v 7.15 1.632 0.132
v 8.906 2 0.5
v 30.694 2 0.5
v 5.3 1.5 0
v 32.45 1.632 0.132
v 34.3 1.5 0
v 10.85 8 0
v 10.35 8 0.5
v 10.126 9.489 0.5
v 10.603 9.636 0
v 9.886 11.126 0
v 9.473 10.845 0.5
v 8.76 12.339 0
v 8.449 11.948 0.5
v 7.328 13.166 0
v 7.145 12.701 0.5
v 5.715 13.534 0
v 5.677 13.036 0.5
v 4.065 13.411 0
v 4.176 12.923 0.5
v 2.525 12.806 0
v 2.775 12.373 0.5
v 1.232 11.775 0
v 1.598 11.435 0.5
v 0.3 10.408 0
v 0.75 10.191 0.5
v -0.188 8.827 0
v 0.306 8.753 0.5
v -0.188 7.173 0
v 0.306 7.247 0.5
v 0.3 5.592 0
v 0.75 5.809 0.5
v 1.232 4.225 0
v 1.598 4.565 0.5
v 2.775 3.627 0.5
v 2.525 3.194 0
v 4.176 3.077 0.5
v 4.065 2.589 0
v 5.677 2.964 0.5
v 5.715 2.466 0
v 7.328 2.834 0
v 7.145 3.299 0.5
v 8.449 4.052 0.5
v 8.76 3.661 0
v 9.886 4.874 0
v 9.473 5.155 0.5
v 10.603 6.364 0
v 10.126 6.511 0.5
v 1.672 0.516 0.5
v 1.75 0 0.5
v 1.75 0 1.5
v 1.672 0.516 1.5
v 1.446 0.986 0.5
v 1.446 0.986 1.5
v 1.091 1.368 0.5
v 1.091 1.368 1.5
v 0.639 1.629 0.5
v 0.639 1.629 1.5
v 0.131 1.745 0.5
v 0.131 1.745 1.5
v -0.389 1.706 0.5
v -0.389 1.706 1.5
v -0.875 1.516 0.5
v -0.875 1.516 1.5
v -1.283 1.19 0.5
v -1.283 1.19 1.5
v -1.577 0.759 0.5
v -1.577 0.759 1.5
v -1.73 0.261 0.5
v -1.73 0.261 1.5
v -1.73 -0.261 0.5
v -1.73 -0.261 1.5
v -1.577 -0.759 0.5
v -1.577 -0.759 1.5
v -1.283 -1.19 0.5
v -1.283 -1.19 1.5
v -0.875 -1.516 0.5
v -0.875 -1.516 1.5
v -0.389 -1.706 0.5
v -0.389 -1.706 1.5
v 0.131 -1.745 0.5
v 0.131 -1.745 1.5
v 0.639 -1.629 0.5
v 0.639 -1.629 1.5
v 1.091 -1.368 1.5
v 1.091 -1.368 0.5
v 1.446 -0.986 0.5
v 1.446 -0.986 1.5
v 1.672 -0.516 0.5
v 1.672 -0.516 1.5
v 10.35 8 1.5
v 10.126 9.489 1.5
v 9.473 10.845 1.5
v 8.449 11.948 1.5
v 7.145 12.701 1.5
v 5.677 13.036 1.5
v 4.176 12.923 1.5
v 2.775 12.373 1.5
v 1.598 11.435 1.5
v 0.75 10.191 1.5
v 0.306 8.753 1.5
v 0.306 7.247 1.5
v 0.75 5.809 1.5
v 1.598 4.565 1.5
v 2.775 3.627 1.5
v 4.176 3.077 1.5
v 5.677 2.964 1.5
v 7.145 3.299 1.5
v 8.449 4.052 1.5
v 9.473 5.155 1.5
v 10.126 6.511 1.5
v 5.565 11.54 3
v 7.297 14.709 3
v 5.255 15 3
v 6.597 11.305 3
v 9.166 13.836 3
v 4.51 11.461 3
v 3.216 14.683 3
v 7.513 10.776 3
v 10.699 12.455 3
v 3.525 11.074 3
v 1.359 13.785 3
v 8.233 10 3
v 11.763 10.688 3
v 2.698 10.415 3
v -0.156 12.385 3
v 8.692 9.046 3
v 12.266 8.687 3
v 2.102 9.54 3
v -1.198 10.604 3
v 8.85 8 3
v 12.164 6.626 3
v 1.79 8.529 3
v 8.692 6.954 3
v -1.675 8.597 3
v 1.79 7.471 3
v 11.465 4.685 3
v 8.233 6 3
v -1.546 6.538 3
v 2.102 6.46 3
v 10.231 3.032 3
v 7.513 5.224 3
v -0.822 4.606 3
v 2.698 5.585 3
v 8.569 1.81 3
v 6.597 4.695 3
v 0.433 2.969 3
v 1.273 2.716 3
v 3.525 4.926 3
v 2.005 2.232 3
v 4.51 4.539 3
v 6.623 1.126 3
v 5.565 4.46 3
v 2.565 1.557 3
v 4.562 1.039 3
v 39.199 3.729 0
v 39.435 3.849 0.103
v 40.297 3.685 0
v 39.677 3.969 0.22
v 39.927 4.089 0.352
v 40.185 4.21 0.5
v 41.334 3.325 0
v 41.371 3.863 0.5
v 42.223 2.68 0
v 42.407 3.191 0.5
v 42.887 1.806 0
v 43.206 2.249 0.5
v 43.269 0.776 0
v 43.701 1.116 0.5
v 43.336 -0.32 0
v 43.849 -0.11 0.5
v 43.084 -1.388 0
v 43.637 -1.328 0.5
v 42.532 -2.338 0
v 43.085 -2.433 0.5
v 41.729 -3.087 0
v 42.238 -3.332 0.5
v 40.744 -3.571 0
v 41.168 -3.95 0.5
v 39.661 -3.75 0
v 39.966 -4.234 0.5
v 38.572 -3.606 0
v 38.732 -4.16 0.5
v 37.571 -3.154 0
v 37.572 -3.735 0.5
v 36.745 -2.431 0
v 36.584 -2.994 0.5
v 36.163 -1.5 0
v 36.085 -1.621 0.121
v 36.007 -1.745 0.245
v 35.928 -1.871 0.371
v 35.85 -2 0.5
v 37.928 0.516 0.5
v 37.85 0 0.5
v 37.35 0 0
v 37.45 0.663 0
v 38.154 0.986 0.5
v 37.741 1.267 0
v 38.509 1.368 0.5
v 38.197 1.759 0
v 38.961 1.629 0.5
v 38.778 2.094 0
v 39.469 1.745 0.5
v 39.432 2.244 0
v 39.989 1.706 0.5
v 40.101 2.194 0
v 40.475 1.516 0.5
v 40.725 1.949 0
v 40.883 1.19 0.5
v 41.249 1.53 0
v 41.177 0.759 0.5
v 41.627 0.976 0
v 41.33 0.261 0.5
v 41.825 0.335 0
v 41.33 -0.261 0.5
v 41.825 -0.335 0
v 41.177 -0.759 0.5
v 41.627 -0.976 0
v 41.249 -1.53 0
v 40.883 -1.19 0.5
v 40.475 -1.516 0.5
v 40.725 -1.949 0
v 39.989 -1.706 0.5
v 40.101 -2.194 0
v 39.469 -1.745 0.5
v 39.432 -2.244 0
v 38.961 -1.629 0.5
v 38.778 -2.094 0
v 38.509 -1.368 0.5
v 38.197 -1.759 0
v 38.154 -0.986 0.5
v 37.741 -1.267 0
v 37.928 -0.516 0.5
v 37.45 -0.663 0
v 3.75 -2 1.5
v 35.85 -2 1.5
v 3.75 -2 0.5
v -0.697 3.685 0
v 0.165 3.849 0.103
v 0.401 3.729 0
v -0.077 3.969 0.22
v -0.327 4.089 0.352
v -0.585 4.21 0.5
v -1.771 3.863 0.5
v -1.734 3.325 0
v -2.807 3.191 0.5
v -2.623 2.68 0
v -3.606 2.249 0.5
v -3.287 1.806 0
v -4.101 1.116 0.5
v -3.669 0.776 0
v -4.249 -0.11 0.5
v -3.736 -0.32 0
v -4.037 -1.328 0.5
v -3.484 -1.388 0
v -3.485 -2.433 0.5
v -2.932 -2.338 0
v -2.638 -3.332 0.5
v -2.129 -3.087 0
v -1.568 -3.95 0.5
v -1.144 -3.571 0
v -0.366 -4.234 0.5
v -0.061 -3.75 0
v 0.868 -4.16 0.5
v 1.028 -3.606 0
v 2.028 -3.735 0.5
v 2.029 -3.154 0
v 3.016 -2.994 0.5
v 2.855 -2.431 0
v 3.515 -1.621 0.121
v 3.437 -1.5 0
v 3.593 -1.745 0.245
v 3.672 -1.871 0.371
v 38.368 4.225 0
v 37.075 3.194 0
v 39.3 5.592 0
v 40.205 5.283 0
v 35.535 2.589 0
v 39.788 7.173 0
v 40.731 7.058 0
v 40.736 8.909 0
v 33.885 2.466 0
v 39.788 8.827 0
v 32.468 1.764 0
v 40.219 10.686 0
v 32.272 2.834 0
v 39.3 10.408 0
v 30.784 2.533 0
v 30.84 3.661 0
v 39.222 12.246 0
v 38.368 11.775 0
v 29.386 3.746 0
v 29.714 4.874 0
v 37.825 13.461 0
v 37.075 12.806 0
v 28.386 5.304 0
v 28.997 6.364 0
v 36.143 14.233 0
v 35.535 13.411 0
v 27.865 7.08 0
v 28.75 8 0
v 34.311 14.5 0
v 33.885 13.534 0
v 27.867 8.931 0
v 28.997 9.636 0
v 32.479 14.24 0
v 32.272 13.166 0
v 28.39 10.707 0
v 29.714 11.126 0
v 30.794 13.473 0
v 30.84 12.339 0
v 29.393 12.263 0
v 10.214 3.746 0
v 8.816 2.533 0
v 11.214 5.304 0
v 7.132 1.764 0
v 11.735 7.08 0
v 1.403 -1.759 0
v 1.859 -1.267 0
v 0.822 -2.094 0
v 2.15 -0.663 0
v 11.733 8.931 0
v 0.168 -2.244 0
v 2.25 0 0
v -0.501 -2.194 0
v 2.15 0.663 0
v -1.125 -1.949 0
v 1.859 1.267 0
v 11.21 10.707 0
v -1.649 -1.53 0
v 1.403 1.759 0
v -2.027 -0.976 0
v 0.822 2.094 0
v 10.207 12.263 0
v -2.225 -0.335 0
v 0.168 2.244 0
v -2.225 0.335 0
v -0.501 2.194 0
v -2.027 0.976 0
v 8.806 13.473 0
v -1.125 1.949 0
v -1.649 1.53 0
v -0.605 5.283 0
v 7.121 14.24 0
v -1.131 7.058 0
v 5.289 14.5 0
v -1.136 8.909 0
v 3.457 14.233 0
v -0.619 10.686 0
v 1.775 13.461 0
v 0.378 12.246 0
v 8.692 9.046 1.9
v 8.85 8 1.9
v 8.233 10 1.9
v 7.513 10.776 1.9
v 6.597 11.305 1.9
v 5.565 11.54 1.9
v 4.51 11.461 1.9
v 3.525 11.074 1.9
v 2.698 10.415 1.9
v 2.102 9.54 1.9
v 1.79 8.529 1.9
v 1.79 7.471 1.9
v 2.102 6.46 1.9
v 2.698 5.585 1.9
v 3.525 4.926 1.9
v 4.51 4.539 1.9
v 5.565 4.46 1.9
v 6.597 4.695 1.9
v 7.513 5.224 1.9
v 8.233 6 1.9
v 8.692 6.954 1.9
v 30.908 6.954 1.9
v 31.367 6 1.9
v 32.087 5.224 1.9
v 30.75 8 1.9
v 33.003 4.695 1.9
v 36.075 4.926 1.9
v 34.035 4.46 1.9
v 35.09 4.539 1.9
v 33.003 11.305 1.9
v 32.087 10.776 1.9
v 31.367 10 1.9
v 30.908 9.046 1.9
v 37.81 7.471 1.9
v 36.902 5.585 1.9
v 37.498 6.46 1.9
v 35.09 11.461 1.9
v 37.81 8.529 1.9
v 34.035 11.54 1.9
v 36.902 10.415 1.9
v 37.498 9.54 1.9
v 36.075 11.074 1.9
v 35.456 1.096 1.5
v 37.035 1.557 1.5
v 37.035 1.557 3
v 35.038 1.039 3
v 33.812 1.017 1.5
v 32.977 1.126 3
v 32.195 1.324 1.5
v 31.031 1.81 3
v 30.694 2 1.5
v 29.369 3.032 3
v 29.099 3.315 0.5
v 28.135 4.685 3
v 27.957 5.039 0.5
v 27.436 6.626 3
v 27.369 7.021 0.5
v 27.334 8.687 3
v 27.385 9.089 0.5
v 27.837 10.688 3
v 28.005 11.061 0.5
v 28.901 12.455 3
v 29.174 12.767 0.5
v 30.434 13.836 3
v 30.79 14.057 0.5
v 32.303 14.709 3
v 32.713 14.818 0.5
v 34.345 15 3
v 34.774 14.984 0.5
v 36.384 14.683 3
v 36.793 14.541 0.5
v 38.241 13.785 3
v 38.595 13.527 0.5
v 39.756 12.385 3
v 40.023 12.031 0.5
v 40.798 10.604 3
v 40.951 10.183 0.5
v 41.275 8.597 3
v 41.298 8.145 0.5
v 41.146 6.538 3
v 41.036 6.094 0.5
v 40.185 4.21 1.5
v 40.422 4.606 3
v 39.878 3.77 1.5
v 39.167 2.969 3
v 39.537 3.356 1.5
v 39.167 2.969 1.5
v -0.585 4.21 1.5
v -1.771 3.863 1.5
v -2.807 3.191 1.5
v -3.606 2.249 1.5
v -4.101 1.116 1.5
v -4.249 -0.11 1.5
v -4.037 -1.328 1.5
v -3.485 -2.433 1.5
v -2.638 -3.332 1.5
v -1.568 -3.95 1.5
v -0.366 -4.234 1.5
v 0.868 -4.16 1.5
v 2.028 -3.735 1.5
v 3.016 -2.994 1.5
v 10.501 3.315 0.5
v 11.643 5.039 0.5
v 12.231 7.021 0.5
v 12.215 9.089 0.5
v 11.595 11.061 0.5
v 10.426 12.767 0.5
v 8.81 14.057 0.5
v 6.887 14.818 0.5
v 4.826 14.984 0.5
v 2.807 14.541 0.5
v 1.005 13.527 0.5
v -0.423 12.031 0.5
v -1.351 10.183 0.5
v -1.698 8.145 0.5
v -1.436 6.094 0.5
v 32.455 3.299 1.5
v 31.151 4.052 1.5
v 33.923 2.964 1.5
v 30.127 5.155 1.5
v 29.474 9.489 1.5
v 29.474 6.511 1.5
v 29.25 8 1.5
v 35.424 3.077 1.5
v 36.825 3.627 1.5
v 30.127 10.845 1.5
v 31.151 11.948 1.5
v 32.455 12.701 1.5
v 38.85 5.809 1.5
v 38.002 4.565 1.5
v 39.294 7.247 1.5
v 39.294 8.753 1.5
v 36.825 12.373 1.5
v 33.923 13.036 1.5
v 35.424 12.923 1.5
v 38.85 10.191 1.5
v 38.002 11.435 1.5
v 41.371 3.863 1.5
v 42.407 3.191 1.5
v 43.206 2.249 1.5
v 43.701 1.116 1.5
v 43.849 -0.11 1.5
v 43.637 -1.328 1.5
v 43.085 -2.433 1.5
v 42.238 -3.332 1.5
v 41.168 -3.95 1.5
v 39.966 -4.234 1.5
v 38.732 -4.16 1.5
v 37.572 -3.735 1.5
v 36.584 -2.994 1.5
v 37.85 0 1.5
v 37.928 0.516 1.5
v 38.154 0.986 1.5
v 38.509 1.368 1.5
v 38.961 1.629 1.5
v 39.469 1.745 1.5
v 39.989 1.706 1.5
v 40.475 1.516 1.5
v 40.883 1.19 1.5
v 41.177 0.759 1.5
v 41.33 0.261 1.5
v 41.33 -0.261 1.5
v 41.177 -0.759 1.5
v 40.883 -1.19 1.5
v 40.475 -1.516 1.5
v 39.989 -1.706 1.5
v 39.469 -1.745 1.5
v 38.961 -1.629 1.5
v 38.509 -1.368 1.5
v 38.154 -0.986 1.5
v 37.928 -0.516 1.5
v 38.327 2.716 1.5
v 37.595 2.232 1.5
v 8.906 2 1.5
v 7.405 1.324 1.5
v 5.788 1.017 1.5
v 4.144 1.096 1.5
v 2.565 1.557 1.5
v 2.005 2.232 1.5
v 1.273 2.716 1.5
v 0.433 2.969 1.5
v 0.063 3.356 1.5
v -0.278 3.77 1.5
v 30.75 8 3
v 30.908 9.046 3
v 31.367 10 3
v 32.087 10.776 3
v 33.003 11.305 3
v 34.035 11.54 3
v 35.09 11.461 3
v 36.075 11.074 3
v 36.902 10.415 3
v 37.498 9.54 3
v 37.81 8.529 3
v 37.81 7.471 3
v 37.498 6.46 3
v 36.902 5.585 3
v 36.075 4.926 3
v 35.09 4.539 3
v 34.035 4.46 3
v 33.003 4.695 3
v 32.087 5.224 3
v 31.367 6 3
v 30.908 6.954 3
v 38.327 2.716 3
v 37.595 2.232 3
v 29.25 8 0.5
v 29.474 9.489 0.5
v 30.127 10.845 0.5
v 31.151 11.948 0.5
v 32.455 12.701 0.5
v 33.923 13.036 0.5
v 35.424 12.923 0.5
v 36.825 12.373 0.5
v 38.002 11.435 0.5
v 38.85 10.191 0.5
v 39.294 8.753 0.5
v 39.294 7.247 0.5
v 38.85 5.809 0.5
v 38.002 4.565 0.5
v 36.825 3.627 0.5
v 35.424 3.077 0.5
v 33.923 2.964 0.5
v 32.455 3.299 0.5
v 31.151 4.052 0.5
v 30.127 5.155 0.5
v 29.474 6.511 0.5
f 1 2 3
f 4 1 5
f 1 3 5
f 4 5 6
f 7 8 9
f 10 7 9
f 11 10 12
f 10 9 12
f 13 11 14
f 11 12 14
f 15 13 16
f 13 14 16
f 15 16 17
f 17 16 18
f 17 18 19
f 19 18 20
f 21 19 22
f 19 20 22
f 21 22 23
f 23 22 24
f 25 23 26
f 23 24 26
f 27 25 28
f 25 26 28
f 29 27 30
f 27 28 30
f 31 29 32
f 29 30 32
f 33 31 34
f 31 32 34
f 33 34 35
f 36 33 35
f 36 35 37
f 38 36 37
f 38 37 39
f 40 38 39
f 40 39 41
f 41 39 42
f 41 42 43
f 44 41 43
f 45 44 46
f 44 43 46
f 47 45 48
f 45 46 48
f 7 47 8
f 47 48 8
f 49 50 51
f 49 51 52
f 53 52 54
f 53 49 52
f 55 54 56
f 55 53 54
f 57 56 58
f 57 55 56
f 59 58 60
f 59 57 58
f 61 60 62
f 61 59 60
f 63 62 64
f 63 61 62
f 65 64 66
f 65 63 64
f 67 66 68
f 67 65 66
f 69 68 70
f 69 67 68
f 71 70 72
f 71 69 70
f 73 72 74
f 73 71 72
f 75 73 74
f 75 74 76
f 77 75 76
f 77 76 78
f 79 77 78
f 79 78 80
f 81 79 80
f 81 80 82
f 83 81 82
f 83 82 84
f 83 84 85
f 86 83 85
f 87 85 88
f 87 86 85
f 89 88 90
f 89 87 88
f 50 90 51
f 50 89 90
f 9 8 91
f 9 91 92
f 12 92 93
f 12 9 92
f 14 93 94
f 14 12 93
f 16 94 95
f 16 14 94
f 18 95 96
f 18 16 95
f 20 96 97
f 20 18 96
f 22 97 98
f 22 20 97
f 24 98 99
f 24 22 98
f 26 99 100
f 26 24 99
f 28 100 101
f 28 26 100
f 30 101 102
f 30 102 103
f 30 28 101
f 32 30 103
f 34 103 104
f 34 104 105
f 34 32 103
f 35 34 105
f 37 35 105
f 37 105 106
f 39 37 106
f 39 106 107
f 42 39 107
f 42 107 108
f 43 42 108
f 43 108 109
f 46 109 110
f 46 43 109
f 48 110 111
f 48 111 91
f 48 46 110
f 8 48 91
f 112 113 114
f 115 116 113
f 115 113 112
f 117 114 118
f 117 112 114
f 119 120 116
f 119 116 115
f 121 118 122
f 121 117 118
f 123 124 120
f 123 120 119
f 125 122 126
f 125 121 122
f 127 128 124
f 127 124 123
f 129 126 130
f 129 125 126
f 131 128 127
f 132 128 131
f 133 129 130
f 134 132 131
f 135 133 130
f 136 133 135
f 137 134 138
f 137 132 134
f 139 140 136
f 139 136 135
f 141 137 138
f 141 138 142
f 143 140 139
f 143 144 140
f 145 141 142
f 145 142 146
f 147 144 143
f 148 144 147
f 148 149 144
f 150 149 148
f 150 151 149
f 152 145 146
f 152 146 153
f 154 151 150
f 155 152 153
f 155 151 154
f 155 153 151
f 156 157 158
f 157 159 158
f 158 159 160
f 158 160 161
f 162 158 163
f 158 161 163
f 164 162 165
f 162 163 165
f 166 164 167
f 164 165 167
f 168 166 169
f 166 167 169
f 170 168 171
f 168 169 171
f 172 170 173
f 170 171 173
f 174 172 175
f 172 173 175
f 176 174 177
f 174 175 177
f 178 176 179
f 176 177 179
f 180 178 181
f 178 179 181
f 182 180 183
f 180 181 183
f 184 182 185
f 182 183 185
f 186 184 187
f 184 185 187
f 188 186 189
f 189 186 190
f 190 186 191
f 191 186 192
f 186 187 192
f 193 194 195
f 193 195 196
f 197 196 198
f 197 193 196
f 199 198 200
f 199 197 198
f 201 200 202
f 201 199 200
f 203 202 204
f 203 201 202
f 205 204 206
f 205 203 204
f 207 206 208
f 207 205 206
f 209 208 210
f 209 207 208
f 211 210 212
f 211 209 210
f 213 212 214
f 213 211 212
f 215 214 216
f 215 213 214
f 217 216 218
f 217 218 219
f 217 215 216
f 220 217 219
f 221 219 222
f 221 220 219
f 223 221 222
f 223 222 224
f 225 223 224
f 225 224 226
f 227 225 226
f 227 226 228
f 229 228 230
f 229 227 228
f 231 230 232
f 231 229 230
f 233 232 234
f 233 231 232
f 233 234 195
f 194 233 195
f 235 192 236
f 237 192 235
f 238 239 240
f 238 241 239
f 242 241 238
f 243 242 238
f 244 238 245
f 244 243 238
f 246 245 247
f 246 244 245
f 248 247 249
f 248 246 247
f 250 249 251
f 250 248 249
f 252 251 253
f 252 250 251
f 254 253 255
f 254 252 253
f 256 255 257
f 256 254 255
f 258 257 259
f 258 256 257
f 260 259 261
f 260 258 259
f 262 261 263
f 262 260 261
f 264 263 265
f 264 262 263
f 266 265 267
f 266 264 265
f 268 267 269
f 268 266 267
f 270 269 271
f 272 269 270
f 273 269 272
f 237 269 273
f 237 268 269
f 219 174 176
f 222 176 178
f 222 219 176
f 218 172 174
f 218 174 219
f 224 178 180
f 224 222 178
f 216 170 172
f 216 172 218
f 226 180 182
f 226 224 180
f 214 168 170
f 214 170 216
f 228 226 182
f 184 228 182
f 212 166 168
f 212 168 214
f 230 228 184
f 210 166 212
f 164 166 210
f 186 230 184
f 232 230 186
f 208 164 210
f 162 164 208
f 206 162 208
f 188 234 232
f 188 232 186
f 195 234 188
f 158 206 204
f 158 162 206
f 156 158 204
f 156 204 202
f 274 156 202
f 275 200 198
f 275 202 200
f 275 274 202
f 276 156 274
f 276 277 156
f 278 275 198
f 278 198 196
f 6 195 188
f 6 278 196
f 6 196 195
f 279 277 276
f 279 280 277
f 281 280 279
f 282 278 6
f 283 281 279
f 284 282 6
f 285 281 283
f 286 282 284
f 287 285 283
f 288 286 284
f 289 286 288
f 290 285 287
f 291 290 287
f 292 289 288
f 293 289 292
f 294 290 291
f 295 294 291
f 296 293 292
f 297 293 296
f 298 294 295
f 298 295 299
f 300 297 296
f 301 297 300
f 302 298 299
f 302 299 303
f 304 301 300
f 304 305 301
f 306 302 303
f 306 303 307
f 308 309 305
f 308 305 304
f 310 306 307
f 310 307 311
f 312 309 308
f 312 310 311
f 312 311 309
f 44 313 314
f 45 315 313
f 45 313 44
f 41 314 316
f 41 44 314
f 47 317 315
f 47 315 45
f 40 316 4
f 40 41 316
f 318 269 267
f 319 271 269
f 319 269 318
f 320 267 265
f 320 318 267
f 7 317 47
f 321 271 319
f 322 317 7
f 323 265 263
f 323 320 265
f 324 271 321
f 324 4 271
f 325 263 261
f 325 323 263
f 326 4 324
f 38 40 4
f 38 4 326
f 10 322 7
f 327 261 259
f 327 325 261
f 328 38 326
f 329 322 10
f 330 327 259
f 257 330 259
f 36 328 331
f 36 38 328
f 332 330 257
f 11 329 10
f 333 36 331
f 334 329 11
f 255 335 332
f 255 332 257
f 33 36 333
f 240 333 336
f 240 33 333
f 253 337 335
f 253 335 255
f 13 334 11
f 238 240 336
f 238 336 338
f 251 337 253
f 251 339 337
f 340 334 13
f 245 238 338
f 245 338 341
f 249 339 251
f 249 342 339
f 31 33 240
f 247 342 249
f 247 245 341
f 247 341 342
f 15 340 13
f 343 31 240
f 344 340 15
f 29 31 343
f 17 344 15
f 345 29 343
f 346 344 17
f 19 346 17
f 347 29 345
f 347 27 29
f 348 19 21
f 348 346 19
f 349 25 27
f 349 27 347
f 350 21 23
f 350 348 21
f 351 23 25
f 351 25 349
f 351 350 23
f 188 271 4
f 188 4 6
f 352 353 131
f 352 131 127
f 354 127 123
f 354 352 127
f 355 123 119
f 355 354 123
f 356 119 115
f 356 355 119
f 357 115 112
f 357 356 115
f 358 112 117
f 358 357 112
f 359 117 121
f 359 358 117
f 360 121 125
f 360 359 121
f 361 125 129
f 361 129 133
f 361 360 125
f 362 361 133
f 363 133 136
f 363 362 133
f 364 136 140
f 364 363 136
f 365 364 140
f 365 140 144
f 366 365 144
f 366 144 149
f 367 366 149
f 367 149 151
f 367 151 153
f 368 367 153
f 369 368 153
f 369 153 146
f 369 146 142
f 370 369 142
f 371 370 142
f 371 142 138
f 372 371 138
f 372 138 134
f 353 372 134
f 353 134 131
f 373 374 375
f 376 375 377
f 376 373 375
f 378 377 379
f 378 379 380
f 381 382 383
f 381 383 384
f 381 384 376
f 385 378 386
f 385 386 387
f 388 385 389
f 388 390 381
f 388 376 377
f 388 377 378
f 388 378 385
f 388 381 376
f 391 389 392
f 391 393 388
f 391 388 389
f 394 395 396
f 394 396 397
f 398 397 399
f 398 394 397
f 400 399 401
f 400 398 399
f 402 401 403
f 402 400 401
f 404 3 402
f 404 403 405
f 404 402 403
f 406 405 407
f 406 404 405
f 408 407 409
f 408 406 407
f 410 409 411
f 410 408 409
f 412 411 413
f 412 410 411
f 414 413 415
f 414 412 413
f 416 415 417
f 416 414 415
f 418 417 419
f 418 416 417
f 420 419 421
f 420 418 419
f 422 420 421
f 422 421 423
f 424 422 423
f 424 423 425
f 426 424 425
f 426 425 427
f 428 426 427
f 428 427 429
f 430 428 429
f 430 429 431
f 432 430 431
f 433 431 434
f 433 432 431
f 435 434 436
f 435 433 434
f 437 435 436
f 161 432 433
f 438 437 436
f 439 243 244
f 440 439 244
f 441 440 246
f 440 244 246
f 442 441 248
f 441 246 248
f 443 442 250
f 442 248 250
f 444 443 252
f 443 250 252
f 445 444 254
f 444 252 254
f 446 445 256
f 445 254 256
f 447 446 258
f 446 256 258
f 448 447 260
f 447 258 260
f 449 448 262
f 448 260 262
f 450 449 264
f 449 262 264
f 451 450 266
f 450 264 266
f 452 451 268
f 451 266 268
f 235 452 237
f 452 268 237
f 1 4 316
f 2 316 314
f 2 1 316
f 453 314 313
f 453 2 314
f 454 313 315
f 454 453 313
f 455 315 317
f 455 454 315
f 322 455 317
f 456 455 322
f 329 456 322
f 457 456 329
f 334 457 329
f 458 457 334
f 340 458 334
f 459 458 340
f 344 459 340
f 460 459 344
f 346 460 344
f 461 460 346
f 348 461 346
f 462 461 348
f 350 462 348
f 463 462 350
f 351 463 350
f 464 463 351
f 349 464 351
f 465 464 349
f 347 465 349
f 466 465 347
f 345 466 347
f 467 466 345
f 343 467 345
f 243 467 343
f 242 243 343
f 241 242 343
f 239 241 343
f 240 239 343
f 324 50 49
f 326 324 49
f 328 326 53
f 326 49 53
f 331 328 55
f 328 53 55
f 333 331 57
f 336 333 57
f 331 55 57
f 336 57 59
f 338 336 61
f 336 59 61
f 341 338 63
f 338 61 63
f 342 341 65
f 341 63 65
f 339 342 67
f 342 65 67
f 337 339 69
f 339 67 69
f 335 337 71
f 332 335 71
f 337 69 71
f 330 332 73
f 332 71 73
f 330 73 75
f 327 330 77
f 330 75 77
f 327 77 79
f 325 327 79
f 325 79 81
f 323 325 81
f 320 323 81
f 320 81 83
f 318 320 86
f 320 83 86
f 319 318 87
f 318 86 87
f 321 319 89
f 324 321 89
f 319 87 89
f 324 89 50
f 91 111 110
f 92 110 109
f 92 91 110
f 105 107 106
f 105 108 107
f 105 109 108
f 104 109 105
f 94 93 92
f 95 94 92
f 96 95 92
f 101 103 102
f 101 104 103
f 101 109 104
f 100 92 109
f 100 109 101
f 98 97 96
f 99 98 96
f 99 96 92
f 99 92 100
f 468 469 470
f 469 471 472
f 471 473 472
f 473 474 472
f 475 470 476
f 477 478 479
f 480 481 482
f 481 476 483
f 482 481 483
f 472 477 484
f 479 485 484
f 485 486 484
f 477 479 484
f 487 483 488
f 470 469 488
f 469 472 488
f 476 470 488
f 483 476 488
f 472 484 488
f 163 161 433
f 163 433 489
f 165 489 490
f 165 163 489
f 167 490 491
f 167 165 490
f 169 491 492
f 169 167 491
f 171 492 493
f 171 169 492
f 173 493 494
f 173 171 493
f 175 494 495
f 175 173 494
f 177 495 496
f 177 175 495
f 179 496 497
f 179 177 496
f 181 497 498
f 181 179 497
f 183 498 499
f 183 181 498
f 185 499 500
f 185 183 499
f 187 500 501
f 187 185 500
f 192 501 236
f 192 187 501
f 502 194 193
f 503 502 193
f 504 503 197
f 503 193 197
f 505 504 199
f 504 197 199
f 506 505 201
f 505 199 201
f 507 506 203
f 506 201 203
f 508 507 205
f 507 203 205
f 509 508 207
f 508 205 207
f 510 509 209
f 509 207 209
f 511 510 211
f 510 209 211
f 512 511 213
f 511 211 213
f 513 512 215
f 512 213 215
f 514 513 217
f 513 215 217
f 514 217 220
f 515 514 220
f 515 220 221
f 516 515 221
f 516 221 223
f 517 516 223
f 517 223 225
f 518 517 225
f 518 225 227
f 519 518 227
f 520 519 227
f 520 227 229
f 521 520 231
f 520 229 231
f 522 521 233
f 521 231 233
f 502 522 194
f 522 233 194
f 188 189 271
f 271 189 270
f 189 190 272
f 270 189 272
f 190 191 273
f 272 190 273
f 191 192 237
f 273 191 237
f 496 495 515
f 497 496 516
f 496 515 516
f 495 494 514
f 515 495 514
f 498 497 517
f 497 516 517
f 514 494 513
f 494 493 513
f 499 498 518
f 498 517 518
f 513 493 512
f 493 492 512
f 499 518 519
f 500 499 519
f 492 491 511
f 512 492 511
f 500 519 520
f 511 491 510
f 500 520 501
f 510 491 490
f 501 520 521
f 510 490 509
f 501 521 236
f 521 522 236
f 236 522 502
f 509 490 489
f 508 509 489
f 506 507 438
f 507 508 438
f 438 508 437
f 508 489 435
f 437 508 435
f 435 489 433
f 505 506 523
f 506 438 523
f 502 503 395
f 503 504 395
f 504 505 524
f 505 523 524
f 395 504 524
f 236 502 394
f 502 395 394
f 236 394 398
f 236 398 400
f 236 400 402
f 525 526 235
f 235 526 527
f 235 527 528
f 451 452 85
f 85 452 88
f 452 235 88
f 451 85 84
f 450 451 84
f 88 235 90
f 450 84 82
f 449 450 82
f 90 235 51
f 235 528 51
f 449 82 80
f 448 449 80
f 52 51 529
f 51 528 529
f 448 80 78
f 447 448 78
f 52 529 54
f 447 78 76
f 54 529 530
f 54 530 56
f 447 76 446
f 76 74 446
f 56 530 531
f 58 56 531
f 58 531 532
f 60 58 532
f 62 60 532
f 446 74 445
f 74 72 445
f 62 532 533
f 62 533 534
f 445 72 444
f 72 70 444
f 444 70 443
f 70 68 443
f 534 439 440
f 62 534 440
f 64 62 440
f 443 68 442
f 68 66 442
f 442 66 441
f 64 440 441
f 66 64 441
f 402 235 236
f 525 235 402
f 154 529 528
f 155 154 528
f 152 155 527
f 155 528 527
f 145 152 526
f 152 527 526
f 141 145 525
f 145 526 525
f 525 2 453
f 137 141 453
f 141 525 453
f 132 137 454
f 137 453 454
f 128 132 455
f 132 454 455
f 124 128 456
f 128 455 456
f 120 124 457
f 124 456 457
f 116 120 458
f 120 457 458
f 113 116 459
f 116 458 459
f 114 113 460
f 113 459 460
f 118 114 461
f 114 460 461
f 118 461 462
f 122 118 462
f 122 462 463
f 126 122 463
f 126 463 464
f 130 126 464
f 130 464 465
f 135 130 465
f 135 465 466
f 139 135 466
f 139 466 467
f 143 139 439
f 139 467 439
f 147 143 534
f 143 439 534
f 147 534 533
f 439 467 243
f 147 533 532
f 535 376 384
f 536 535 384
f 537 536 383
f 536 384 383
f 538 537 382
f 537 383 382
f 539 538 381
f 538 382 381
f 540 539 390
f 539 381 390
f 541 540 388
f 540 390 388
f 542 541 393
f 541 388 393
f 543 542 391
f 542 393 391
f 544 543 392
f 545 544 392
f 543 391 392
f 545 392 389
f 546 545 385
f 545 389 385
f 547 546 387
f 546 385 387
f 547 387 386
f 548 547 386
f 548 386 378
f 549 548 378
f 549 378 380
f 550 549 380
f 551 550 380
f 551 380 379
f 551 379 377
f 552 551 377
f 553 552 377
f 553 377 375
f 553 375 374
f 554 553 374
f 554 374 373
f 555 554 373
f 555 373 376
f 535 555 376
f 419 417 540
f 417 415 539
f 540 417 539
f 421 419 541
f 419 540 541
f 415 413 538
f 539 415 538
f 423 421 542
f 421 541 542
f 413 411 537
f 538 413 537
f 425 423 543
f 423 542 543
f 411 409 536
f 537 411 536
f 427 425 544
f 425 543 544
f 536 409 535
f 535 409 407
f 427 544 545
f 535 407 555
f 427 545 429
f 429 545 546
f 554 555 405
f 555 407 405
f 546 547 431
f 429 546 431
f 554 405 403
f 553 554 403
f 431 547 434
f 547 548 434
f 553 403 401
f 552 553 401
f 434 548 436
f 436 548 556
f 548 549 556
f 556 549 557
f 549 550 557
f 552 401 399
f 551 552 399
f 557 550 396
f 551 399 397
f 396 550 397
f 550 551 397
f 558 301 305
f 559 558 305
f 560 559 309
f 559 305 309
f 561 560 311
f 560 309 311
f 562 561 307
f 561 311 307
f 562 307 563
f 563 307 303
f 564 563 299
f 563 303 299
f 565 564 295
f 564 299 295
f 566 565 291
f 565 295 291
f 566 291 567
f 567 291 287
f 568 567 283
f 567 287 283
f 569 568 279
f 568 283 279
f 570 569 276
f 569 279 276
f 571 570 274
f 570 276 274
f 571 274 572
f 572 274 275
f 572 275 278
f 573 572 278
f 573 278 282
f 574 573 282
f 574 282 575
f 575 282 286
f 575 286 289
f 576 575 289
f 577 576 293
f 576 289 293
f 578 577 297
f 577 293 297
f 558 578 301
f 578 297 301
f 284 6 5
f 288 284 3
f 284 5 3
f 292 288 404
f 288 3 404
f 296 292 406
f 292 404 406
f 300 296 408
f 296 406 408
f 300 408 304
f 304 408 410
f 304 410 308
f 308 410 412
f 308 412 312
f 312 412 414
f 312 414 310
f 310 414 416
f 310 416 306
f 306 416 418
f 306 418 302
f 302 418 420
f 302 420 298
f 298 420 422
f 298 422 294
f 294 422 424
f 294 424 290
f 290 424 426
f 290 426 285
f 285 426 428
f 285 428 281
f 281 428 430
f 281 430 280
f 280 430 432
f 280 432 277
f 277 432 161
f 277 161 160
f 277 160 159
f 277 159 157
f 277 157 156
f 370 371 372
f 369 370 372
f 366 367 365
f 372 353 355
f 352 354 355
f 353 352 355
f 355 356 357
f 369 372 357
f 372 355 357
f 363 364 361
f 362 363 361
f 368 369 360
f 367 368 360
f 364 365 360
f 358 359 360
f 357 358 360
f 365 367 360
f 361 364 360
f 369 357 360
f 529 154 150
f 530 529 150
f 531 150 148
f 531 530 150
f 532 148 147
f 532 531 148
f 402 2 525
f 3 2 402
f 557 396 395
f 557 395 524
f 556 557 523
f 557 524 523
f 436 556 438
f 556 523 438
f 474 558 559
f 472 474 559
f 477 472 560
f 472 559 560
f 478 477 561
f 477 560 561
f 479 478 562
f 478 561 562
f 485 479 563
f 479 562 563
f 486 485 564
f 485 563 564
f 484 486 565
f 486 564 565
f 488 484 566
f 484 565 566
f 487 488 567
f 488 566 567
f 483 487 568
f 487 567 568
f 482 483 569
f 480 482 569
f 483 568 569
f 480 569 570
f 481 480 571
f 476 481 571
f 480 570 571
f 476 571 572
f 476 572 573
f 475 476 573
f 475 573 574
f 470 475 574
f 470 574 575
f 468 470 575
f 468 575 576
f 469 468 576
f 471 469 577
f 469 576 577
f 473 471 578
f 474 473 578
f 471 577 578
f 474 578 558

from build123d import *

# Parameters (mm, degrees)
CROQUIS1_R              = 5.05
CROQUIS1_R_2            = 1.7500000000000002
SALIENTE_EXTRUIR1_DEPTH = 1.5
CROQUIS8_R              = 7
CROQUIS8_R_2            = 3.5499999999999994
SALIENTE_EXTRUIR5_DEPTH = 1.5
CROQUIS9_R              = 3
CORTAR_EXTRUIR3_DEPTH   = 1.5
CROQUIS10_R             = 3.55
SALIENTE_EXTRUIR6_DEPTH = 0.4
CHAFL_N1_SIZE           = 0.5


with BuildPart() as part:
    # Croquis1 → Saliente-Extruir1 (new body)
    with BuildSketch(Plane.XY):
        with BuildLine():
            Line((3.75, -2.0000000000000004), (19.8, -2))
            Line((19.8, -2), (19.8, 2))
            Line((19.8, 2), (8.90555127546391, 2))
            ThreePointArc((8.905551275463925, 1.9999999999999556), (6.887272990754048, 14.817665616090519), (-0.5849400470518447, 4.209554031171866))
            ThreePointArc((-0.5849400470518499, 4.209554031171828), (-3.484830188538549, -2.4327882269220193), (3.7499999999999996, -2.0000000000000013))
        make_face()
        with Locations((5.299999999999999, 8)):
            Circle(CROQUIS1_R, mode=Mode.SUBTRACT)
        Circle(CROQUIS1_R_2, mode=Mode.SUBTRACT)
    extrude(amount=SALIENTE_EXTRUIR1_DEPTH)

    # Croquis8 → Saliente-Extruir5 (add)
    with BuildSketch(Plane.XY.offset(1.5)):
        with Locations(Location((5.299999999999999, 8, 0), (0, 0, 212.785282787))):
            Circle(CROQUIS8_R)
        with Locations((5.299999999999999, 8)):
            Circle(CROQUIS8_R_2, mode=Mode.SUBTRACT)
    extrude(amount=SALIENTE_EXTRUIR5_DEPTH)

    # Croquis9 → Cortar-Extruir3 (cut)
    with BuildSketch(Plane.XY.offset(1.5)):
        Circle(CROQUIS9_R)
    extrude(amount=CORTAR_EXTRUIR3_DEPTH, mode=Mode.SUBTRACT)

    # Croquis10 → Saliente-Extruir6 (add)
    with BuildSketch(Plane(origin=(0, 0, 1.5), x_dir=(-1, 0, 0), z_dir=(0, 0, -1))):
        with Locations((-5.299999999999999, 8)):
            Circle(CROQUIS10_R)
    extrude(amount=-SALIENTE_EXTRUIR6_DEPTH)

    # Simetría1: part across plane


with BuildPart() as part_1:
    add(part.part)
    add(part.part.mirror(Plane(origin=(19.8, 0, 1.5), x_dir=(0, 0, 1), z_dir=(1, 0, 0))))

    # Chaflán1
    chafl_n1_edges = [part_1.edges().sort_by_distance(p)[0] for p in [
        (19.8, -2.000000000000001, 0),
        (-3.484830188538548, -2.4327882269220202, 0),
        (6.887272990754054, 14.817665616090517, 0),
        (41.35, 2.1e-16, 0),
        (39.35, 8, 0),
        (32.712727009245945, 14.817665616090517, 0),
        (43.08483018853855, -2.4327882269220202, 0),
        (0.2499999999999991, 8, 0),
        (-1.7500000000000002, 2.1e-16, 0),
        (19.8, 1.999999999999977, 0),
    ]]
    chamfer(chafl_n1_edges, length=CHAFL_N1_SIZE)


solid = part_1.part
